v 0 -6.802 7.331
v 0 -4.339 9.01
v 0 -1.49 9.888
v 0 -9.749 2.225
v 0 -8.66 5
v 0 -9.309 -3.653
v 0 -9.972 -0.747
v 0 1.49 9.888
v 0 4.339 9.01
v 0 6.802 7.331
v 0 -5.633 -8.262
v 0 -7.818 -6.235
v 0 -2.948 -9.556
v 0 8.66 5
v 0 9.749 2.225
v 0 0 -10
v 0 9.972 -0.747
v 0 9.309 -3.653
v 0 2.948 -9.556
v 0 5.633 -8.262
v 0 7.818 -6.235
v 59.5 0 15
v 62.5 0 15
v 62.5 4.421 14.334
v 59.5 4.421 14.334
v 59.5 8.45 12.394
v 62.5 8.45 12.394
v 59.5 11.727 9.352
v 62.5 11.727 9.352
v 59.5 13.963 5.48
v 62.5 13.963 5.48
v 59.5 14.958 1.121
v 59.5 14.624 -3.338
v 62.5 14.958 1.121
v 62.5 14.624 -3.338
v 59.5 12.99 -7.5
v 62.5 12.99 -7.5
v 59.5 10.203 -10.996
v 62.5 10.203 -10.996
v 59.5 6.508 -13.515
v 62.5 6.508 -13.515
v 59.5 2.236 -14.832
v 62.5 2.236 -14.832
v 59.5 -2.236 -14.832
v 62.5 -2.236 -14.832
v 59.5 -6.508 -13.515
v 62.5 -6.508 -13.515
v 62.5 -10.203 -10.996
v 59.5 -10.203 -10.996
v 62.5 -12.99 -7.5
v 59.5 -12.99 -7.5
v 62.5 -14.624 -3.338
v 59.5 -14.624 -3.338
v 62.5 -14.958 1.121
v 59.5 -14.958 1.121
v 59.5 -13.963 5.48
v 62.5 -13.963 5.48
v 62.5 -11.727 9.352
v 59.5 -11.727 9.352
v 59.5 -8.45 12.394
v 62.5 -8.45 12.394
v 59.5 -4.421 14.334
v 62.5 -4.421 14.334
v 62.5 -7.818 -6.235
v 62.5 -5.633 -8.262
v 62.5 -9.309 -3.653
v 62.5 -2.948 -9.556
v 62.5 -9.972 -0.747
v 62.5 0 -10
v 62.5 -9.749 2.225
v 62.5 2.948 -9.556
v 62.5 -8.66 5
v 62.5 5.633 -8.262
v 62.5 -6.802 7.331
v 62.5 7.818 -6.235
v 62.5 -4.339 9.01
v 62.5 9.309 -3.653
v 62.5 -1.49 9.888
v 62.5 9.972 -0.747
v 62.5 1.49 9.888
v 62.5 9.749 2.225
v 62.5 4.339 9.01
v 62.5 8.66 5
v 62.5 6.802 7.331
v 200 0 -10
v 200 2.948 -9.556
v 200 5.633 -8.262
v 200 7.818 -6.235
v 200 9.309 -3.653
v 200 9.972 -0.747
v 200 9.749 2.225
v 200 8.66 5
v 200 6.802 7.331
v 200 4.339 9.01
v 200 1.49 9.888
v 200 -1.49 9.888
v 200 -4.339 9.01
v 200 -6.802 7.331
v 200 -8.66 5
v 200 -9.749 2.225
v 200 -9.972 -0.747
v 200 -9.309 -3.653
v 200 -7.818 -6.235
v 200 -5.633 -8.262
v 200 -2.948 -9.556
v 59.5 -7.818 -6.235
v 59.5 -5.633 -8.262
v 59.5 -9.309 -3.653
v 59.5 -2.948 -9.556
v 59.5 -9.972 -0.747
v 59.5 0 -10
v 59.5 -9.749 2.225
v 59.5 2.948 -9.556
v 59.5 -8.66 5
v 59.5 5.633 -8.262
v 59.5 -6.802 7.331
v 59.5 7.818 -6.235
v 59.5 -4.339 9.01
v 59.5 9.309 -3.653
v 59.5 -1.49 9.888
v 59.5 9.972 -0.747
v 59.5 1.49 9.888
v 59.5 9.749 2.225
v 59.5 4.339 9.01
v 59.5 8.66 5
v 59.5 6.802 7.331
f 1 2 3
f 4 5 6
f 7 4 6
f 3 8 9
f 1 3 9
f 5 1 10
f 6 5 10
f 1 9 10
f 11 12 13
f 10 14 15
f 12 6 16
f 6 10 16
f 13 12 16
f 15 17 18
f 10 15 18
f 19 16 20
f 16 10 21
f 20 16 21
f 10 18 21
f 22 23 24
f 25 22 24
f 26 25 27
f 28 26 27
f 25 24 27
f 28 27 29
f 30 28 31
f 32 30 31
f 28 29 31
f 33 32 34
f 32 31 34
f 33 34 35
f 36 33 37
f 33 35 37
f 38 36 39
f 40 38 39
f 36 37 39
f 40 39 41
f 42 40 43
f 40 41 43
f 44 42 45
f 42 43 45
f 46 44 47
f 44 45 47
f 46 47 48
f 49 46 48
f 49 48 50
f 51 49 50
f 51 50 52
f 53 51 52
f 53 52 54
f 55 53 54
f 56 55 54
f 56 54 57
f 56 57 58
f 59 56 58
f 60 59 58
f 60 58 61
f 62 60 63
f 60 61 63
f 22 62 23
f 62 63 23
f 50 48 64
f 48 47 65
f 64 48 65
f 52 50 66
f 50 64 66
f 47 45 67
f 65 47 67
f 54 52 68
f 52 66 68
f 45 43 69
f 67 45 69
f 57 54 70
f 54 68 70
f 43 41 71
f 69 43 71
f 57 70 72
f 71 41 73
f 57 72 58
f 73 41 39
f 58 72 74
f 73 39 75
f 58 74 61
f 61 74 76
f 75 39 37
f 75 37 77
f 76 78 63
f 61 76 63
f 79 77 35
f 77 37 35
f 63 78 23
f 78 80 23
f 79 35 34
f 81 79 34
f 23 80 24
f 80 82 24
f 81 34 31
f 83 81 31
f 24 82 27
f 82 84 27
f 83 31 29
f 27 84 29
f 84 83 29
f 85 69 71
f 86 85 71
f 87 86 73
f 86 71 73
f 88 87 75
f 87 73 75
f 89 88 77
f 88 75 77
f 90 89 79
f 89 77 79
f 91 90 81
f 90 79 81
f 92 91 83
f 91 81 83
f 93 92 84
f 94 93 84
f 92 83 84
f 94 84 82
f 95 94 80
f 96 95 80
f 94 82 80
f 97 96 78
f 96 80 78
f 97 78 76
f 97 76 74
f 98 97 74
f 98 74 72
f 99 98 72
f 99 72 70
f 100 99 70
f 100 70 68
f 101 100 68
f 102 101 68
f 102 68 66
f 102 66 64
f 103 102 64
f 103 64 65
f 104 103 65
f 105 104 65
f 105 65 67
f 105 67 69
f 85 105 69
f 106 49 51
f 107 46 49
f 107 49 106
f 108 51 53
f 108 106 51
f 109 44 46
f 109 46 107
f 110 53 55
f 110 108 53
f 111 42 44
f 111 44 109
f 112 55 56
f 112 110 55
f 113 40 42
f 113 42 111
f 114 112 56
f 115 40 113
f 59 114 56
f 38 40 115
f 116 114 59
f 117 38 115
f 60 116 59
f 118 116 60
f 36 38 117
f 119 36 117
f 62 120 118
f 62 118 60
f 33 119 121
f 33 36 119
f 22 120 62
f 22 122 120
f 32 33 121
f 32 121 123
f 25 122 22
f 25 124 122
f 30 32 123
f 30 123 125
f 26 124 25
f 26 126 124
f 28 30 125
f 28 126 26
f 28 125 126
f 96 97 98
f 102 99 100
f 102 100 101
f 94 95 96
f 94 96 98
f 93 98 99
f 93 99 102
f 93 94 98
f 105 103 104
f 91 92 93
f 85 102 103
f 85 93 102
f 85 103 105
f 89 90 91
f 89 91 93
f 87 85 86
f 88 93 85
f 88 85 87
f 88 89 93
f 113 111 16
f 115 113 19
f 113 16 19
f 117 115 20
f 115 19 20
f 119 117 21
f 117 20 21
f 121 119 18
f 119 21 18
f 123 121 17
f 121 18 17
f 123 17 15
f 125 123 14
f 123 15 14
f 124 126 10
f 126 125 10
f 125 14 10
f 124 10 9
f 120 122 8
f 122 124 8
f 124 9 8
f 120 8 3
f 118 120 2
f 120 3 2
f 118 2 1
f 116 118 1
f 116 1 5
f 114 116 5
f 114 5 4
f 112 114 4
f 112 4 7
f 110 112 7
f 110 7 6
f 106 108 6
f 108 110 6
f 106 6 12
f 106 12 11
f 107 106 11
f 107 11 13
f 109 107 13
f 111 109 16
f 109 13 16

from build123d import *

# Parameters (mm, degrees)
CROQUIS1_R              = 10
SALIENTE_EXTRUIR1_DEPTH = 200
CROQUIS2_R              = 15
SALIENTE_EXTRUIR2_DEPTH = 3


with BuildPart() as part:
    # Croquis1 → Saliente-Extruir1 (new body)
    with BuildSketch(Plane(origin=(0, 0, 0), x_dir=(0, 0, -1), z_dir=(1, 0, 0))):
        Circle(CROQUIS1_R)
    extrude(amount=SALIENTE_EXTRUIR1_DEPTH)

    # Croquis2 → Saliente-Extruir2 (add)
    with BuildSketch(Plane.ZY.offset(-62.5)):
        Circle(CROQUIS2_R)
    extrude(amount=SALIENTE_EXTRUIR2_DEPTH)


solid = part.part
